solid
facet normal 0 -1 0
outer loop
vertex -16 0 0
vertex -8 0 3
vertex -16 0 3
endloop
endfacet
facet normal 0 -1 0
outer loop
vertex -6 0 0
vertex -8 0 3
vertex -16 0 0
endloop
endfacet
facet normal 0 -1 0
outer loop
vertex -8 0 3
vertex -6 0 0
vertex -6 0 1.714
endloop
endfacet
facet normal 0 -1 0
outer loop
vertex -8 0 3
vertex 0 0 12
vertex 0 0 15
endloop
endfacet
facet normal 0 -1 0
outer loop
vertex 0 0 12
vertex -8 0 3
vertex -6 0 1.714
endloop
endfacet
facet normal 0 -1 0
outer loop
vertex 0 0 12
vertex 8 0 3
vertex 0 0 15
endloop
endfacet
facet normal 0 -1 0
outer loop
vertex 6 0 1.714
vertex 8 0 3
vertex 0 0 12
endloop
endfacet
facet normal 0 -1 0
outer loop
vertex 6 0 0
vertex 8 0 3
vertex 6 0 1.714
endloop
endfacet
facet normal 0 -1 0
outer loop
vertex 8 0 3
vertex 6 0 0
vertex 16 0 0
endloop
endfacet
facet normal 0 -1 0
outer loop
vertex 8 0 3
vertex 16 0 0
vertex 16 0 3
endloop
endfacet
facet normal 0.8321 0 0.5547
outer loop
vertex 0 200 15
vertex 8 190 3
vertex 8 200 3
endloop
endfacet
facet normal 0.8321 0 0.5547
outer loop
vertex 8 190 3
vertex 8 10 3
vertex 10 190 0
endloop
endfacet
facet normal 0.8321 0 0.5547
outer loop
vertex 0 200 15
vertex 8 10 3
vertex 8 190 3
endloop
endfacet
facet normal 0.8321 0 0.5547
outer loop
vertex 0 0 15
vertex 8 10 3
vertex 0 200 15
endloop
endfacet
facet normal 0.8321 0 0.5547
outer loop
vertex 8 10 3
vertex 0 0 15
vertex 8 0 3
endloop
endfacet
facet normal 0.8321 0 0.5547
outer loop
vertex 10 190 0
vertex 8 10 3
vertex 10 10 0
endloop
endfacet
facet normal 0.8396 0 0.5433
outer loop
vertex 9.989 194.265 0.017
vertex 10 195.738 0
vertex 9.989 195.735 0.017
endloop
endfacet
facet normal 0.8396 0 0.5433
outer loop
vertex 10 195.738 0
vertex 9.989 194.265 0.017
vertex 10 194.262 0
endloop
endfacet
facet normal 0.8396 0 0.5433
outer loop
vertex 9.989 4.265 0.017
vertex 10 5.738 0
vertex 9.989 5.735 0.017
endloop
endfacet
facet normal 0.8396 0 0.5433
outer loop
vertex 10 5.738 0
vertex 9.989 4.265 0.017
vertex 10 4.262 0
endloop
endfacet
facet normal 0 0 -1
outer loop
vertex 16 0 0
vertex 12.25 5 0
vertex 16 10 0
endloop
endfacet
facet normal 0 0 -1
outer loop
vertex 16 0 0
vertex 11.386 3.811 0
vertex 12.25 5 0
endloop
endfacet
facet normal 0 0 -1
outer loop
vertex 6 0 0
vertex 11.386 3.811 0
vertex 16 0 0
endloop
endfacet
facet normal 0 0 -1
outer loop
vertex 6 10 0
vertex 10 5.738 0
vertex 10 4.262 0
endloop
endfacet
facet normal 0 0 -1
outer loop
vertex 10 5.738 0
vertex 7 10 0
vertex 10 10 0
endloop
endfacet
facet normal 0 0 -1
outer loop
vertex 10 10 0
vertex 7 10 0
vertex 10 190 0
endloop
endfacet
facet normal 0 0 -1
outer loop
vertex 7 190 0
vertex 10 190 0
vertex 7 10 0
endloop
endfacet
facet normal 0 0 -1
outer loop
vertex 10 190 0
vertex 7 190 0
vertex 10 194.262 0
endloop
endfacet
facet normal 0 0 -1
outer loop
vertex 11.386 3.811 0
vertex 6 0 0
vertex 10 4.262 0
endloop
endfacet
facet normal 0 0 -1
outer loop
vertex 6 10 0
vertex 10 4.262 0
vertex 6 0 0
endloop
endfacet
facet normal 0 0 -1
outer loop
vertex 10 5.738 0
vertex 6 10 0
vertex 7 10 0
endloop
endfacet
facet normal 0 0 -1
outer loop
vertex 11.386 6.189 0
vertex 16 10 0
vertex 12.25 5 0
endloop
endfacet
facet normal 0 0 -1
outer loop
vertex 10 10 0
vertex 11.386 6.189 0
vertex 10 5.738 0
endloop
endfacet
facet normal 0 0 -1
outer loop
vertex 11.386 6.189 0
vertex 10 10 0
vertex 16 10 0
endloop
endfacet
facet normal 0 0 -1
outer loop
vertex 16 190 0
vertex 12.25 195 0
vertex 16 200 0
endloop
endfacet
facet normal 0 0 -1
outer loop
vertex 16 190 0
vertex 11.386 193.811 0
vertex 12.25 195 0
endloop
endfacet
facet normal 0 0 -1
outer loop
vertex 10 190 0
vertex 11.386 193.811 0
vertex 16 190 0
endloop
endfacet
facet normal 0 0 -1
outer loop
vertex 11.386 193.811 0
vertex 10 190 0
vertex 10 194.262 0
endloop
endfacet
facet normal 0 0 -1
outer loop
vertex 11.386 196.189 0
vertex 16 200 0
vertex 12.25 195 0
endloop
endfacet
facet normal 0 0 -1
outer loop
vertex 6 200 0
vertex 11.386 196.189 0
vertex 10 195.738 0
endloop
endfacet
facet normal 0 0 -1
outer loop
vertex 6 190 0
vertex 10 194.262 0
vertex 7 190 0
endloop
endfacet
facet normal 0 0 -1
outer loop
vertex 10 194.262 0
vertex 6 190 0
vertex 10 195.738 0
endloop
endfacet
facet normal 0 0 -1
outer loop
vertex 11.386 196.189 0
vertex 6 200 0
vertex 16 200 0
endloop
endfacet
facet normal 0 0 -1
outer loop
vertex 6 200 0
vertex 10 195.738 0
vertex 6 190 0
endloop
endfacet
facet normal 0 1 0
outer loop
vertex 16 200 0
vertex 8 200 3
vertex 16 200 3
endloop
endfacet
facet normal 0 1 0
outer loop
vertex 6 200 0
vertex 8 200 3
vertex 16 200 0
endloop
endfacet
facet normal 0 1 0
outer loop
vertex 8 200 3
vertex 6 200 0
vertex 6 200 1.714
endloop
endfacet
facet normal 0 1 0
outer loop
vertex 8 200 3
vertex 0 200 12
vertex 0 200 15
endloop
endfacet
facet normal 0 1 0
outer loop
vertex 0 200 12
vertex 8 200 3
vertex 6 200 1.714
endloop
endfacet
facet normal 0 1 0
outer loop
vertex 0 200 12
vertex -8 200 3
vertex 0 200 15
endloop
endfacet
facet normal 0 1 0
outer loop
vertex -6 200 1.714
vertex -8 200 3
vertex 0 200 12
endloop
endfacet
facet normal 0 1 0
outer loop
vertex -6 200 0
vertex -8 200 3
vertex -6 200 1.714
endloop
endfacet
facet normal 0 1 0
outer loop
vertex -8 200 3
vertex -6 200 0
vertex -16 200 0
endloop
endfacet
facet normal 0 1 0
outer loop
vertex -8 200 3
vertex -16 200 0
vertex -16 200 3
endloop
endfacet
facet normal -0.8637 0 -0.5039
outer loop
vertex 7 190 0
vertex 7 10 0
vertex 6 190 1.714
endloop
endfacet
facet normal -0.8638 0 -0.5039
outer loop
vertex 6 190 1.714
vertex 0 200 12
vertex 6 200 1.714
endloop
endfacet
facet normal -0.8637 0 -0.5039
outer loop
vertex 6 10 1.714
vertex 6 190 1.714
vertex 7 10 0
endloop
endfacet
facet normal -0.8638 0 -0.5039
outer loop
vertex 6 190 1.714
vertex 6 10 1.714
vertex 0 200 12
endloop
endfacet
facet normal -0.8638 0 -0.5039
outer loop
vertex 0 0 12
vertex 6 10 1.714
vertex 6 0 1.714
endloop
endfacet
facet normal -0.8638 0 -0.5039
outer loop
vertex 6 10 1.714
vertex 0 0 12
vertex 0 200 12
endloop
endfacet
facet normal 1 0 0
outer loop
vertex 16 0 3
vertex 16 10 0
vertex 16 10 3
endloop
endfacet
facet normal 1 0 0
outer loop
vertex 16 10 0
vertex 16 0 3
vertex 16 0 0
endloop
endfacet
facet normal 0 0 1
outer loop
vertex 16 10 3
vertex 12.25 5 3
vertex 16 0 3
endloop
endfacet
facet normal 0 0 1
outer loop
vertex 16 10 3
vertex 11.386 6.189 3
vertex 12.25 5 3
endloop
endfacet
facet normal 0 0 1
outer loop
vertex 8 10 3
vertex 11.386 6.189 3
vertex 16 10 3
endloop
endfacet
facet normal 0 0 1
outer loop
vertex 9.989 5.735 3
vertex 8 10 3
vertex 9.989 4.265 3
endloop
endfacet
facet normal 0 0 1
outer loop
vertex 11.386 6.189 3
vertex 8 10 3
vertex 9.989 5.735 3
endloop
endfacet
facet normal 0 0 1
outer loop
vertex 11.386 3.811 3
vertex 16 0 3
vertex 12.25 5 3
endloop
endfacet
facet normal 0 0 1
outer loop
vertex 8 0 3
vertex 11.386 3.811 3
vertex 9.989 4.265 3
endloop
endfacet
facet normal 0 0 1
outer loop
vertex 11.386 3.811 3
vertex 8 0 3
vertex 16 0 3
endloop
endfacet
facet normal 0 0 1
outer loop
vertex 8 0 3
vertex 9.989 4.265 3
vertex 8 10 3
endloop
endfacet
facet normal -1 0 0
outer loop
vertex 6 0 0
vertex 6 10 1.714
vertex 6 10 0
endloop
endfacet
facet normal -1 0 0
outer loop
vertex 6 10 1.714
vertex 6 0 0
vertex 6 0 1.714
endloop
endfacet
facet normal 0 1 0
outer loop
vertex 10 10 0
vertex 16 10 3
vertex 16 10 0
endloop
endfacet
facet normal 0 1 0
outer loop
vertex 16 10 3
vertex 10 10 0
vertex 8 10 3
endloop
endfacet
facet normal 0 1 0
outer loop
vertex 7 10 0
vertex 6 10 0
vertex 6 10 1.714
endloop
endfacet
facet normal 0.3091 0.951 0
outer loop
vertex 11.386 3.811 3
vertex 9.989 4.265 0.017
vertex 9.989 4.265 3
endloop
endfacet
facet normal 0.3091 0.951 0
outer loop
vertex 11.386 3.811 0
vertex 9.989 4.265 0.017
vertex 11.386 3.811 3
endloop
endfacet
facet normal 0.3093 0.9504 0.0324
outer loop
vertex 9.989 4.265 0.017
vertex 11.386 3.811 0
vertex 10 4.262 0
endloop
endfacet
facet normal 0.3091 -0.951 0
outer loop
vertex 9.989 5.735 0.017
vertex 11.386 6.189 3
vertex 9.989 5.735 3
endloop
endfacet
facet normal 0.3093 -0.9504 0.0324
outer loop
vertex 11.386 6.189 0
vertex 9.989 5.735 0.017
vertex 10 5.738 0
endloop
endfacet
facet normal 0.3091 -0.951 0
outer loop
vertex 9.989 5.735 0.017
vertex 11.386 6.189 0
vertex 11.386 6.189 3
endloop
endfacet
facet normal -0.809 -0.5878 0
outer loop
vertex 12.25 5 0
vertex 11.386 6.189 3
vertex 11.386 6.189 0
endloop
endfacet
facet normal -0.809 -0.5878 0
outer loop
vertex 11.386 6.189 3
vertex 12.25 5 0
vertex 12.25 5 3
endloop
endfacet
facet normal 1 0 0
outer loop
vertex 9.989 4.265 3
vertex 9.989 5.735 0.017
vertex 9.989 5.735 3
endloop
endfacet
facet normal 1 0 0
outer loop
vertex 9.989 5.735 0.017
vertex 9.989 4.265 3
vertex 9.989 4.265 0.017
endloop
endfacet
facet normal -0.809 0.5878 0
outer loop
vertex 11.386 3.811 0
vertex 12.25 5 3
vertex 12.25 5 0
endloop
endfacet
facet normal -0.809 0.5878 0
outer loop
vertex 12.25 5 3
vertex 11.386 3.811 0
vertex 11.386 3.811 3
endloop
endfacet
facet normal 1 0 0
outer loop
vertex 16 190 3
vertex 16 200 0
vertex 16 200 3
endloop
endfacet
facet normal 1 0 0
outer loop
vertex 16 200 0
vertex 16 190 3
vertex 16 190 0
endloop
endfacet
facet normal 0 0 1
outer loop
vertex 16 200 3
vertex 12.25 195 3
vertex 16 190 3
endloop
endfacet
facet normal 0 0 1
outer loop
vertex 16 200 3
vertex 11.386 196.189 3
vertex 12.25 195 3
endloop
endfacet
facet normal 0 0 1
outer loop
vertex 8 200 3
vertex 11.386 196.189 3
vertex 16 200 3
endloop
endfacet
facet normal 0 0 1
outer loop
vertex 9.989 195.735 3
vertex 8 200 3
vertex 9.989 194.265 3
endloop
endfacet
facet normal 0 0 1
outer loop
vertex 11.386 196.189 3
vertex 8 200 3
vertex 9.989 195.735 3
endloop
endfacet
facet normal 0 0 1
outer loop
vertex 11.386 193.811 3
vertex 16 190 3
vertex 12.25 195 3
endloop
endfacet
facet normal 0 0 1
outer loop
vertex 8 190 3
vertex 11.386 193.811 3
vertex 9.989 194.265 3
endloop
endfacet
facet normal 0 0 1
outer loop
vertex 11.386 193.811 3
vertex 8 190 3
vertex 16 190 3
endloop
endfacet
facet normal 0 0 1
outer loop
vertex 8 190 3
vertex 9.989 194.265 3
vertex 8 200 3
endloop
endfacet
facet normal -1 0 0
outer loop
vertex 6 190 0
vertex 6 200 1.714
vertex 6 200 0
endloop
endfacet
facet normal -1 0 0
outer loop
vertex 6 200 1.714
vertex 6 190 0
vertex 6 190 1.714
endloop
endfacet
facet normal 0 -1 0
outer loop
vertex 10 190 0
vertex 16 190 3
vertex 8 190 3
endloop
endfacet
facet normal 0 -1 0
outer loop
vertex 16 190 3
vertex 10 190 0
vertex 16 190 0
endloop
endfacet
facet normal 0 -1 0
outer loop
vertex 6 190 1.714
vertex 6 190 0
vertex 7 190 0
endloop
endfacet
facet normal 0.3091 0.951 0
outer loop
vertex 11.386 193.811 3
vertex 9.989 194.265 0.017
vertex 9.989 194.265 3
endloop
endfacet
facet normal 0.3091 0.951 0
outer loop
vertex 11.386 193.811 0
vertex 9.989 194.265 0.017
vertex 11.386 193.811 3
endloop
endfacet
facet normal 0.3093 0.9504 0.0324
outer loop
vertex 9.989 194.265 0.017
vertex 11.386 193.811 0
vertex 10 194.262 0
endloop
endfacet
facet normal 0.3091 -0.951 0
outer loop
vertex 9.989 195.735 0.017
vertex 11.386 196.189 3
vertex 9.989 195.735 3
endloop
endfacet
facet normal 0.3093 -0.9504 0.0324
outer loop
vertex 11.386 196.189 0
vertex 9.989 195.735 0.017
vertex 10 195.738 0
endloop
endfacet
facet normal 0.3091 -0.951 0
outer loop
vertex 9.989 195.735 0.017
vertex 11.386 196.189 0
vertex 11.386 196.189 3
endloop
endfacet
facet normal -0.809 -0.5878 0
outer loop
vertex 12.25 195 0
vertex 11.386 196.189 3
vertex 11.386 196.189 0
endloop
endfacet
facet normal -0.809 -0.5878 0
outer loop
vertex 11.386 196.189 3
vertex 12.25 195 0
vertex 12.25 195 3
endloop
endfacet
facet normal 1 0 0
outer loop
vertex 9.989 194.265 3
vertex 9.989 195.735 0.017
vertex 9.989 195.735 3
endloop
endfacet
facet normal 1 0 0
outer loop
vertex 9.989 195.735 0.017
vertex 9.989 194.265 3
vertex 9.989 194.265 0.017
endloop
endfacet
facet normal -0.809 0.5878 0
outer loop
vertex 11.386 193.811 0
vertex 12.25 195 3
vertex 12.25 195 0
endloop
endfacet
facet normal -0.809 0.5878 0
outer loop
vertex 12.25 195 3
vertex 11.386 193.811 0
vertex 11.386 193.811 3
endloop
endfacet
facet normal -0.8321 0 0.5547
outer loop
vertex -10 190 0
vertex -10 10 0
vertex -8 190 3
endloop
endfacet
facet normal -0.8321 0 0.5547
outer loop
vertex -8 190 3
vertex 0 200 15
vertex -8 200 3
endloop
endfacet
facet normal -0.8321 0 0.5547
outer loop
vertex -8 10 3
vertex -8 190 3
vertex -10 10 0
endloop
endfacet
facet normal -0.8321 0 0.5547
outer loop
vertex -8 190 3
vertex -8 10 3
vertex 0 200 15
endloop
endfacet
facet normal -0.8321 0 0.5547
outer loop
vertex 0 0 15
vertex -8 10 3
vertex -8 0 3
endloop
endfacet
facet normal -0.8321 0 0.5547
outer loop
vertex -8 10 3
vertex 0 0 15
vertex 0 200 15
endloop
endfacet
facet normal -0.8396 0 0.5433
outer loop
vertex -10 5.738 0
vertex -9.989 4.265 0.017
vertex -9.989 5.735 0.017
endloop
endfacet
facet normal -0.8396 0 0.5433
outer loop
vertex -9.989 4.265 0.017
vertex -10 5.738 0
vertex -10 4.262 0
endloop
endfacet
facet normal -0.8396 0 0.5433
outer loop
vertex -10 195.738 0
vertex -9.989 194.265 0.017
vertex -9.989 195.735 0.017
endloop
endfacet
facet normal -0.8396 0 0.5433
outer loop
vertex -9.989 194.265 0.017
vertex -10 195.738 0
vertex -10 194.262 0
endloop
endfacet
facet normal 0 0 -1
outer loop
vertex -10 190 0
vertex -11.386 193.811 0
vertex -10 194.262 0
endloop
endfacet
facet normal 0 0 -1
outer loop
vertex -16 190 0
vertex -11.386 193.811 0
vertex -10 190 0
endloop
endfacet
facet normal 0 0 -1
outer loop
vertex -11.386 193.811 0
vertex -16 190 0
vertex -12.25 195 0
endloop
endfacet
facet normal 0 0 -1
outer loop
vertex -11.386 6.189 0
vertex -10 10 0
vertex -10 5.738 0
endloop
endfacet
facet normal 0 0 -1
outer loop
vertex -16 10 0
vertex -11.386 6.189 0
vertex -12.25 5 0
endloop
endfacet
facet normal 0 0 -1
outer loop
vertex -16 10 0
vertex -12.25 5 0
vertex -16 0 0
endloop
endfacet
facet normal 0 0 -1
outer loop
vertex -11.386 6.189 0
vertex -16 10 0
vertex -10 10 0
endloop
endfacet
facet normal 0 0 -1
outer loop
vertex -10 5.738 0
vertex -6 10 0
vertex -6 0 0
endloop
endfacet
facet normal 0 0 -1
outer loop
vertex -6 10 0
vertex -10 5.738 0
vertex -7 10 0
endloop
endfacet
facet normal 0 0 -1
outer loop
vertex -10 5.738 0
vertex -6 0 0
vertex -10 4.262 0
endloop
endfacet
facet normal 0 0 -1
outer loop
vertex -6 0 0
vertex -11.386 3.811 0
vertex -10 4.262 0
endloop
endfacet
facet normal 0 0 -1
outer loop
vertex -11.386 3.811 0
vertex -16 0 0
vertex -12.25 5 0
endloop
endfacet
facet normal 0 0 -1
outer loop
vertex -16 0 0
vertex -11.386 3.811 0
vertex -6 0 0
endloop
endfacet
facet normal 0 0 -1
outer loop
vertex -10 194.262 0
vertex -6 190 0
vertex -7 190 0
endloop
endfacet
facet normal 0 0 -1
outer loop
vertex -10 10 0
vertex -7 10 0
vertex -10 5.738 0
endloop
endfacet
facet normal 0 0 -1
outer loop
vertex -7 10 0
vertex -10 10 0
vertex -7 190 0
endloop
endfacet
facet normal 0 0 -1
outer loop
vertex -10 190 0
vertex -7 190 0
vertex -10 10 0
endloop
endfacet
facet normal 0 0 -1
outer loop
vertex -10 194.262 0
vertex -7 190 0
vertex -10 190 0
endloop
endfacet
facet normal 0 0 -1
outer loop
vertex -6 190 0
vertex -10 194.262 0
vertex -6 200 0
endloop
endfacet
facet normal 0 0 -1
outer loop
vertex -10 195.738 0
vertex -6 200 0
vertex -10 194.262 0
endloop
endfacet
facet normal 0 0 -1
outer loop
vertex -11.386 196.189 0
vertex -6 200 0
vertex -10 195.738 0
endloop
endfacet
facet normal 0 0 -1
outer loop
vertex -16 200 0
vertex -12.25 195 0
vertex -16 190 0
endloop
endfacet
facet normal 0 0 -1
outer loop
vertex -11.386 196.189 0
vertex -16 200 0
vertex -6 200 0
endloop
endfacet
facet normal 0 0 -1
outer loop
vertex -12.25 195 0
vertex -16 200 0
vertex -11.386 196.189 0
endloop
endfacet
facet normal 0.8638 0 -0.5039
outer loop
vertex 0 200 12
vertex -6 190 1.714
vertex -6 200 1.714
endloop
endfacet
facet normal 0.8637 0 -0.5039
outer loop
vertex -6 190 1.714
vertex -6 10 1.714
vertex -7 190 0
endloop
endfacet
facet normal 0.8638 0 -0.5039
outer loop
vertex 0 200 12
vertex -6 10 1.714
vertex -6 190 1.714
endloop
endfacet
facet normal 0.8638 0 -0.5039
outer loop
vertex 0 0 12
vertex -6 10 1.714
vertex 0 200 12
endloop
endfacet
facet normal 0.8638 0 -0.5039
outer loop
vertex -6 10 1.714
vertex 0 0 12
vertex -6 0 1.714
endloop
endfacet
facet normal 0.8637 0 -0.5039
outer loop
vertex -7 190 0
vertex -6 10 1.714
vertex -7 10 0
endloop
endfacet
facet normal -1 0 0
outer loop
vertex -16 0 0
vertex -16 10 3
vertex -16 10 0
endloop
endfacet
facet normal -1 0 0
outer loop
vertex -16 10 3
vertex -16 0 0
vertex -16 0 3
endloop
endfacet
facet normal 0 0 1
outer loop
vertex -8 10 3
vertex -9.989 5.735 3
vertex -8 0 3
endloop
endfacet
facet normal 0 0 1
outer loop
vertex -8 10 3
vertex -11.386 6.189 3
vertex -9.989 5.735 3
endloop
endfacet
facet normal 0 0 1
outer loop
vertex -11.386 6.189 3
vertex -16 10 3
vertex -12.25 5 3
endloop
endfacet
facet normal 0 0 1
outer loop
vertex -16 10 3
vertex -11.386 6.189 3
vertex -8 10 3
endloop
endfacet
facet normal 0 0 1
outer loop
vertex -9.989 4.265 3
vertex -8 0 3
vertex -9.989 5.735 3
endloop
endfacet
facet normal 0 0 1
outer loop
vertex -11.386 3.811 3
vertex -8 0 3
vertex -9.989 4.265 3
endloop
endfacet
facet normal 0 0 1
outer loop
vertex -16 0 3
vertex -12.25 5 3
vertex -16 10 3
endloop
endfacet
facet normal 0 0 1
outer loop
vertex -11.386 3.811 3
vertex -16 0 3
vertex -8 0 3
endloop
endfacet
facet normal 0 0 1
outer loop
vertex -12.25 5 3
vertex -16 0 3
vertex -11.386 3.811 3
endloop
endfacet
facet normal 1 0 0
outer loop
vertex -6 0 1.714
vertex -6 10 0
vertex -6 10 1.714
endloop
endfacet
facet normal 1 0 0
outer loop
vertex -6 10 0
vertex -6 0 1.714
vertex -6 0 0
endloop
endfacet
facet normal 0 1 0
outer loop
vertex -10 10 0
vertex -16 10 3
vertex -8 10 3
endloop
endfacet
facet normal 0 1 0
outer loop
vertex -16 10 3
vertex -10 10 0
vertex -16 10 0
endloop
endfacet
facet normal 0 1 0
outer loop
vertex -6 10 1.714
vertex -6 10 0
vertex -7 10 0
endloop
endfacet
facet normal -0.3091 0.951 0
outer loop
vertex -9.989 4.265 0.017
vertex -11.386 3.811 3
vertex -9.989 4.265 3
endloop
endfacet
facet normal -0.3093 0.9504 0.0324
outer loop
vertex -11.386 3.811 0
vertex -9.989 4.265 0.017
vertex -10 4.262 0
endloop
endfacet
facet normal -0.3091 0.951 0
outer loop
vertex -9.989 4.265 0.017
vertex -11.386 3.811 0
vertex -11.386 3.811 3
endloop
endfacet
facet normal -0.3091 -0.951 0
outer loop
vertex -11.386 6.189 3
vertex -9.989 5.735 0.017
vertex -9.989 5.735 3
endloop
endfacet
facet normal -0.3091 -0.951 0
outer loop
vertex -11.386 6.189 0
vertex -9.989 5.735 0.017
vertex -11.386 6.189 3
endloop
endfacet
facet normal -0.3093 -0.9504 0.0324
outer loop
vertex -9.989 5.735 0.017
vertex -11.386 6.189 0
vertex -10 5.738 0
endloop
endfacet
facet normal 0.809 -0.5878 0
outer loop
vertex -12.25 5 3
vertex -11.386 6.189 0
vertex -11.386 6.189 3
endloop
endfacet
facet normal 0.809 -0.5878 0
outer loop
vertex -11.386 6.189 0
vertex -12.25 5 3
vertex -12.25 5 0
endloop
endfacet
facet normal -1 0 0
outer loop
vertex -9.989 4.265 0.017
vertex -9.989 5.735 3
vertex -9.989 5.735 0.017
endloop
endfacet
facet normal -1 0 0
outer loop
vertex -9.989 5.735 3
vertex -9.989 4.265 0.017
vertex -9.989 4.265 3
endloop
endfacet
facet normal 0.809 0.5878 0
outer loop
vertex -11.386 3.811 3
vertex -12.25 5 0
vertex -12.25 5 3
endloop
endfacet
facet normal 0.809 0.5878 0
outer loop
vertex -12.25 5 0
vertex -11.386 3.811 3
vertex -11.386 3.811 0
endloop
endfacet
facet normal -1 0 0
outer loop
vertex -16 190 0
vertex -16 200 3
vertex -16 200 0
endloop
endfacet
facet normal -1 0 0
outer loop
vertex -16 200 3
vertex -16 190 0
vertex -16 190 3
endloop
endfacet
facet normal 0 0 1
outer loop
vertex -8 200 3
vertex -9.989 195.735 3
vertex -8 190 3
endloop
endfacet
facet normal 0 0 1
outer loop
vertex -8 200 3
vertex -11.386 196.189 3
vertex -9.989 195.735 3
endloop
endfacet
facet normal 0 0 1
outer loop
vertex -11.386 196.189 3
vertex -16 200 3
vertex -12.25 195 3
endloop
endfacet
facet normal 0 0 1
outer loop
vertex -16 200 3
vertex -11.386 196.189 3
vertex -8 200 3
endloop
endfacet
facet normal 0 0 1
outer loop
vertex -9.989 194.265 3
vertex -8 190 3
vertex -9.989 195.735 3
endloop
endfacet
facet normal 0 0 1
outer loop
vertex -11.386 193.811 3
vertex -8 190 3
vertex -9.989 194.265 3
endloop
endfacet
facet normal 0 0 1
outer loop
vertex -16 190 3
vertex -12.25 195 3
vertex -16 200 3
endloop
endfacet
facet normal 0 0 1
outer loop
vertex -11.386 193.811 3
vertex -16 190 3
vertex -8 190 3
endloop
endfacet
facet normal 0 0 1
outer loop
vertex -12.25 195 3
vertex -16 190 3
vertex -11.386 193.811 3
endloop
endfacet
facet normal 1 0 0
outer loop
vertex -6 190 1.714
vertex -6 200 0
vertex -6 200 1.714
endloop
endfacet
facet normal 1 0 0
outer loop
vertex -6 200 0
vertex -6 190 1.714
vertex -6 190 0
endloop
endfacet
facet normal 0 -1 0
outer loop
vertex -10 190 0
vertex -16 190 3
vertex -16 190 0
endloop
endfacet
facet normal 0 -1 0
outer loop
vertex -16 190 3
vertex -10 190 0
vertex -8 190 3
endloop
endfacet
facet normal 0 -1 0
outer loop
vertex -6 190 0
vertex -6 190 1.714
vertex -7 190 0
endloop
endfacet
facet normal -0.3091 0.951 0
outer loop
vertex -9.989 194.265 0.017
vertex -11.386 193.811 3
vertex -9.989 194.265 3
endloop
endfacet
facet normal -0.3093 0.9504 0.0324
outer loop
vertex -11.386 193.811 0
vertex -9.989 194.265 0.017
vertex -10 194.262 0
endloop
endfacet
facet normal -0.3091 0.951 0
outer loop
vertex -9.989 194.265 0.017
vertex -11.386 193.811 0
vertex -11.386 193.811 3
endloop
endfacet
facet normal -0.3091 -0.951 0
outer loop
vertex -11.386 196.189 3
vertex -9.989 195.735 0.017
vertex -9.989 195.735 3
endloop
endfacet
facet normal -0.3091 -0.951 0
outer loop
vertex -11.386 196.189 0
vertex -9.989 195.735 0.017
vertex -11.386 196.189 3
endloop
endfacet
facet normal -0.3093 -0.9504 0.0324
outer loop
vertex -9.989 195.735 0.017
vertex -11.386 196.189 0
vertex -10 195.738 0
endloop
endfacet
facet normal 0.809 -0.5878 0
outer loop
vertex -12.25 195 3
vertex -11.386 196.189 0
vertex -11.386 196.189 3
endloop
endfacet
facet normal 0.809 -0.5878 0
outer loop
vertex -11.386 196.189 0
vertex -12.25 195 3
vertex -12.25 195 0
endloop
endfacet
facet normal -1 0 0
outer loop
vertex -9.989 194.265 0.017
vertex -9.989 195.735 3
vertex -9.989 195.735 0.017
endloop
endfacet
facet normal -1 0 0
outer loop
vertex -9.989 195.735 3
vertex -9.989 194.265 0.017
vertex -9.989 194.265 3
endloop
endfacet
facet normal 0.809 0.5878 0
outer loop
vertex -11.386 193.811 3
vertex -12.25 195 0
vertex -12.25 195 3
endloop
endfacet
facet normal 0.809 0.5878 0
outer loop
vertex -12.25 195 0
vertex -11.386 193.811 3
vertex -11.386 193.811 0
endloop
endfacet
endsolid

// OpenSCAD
module prism(l, w, h) {
       polyhedron(points=[
               [0,0,h],           // 0    front top corner
               [0,0,0],[w,0,0],   // 1, 2 front left & right bottom corners
               [0,l,h],           // 3    back top corner
               [0,l,0],[w,l,0]    // 4, 5 back left & right bottom corners
       ], faces=[ // points for all faces must be ordered clockwise when looking in
               [0,2,1],    // top face
               [3,4,5],    // base face
               [0,1,4,3],  // h face
               [1,2,5,4],  // w face
               [0,3,5,2],  // hypotenuse face
       ]);
}

module 3dHypot(l=50, w=20, h=10, thick=1){
    difference(){
        prism(l=l, w=w/2, h=h);
        prism(l=l, w=w/2-thick, h=h-thick);
    }
}

module anchor(dim=[10,10,3], holeDiam=4.5){
    translate([dim[0]/2, dim[1]/2, dim[2]/2])
    difference(){
        cube(anchorDim, center=true);
        cylinder(h=dim[2]+1, d=holeDiam, center=true);
    };
}

length = 200;
width = 20;
height = 15;
thickness = 3;

anchorDim = [10, 10, 3];
screwHoleDiam = 2.5;

3dHypot(l=length, w=width, h=height, thick=thickness
);
translate([width/2-4,0,0]) anchor(dim=anchorDim, holeDiam=screwHoleDiam);
translate([width/2-4, length-anchorDim[1], 0]) anchor(dim=anchorDim, holeDiam=screwHoleDiam);

mirror(){
    3dHypot(l=length, w=width, h=height, thick=thickness);
    translate([width/2-4,0,0]) anchor(dim=anchorDim, holeDiam=screwHoleDiam);
    translate([width/2-4, length-anchorDim[1], 0]) anchor(dim=anchorDim, holeDiam=screwHoleDiam);
}
